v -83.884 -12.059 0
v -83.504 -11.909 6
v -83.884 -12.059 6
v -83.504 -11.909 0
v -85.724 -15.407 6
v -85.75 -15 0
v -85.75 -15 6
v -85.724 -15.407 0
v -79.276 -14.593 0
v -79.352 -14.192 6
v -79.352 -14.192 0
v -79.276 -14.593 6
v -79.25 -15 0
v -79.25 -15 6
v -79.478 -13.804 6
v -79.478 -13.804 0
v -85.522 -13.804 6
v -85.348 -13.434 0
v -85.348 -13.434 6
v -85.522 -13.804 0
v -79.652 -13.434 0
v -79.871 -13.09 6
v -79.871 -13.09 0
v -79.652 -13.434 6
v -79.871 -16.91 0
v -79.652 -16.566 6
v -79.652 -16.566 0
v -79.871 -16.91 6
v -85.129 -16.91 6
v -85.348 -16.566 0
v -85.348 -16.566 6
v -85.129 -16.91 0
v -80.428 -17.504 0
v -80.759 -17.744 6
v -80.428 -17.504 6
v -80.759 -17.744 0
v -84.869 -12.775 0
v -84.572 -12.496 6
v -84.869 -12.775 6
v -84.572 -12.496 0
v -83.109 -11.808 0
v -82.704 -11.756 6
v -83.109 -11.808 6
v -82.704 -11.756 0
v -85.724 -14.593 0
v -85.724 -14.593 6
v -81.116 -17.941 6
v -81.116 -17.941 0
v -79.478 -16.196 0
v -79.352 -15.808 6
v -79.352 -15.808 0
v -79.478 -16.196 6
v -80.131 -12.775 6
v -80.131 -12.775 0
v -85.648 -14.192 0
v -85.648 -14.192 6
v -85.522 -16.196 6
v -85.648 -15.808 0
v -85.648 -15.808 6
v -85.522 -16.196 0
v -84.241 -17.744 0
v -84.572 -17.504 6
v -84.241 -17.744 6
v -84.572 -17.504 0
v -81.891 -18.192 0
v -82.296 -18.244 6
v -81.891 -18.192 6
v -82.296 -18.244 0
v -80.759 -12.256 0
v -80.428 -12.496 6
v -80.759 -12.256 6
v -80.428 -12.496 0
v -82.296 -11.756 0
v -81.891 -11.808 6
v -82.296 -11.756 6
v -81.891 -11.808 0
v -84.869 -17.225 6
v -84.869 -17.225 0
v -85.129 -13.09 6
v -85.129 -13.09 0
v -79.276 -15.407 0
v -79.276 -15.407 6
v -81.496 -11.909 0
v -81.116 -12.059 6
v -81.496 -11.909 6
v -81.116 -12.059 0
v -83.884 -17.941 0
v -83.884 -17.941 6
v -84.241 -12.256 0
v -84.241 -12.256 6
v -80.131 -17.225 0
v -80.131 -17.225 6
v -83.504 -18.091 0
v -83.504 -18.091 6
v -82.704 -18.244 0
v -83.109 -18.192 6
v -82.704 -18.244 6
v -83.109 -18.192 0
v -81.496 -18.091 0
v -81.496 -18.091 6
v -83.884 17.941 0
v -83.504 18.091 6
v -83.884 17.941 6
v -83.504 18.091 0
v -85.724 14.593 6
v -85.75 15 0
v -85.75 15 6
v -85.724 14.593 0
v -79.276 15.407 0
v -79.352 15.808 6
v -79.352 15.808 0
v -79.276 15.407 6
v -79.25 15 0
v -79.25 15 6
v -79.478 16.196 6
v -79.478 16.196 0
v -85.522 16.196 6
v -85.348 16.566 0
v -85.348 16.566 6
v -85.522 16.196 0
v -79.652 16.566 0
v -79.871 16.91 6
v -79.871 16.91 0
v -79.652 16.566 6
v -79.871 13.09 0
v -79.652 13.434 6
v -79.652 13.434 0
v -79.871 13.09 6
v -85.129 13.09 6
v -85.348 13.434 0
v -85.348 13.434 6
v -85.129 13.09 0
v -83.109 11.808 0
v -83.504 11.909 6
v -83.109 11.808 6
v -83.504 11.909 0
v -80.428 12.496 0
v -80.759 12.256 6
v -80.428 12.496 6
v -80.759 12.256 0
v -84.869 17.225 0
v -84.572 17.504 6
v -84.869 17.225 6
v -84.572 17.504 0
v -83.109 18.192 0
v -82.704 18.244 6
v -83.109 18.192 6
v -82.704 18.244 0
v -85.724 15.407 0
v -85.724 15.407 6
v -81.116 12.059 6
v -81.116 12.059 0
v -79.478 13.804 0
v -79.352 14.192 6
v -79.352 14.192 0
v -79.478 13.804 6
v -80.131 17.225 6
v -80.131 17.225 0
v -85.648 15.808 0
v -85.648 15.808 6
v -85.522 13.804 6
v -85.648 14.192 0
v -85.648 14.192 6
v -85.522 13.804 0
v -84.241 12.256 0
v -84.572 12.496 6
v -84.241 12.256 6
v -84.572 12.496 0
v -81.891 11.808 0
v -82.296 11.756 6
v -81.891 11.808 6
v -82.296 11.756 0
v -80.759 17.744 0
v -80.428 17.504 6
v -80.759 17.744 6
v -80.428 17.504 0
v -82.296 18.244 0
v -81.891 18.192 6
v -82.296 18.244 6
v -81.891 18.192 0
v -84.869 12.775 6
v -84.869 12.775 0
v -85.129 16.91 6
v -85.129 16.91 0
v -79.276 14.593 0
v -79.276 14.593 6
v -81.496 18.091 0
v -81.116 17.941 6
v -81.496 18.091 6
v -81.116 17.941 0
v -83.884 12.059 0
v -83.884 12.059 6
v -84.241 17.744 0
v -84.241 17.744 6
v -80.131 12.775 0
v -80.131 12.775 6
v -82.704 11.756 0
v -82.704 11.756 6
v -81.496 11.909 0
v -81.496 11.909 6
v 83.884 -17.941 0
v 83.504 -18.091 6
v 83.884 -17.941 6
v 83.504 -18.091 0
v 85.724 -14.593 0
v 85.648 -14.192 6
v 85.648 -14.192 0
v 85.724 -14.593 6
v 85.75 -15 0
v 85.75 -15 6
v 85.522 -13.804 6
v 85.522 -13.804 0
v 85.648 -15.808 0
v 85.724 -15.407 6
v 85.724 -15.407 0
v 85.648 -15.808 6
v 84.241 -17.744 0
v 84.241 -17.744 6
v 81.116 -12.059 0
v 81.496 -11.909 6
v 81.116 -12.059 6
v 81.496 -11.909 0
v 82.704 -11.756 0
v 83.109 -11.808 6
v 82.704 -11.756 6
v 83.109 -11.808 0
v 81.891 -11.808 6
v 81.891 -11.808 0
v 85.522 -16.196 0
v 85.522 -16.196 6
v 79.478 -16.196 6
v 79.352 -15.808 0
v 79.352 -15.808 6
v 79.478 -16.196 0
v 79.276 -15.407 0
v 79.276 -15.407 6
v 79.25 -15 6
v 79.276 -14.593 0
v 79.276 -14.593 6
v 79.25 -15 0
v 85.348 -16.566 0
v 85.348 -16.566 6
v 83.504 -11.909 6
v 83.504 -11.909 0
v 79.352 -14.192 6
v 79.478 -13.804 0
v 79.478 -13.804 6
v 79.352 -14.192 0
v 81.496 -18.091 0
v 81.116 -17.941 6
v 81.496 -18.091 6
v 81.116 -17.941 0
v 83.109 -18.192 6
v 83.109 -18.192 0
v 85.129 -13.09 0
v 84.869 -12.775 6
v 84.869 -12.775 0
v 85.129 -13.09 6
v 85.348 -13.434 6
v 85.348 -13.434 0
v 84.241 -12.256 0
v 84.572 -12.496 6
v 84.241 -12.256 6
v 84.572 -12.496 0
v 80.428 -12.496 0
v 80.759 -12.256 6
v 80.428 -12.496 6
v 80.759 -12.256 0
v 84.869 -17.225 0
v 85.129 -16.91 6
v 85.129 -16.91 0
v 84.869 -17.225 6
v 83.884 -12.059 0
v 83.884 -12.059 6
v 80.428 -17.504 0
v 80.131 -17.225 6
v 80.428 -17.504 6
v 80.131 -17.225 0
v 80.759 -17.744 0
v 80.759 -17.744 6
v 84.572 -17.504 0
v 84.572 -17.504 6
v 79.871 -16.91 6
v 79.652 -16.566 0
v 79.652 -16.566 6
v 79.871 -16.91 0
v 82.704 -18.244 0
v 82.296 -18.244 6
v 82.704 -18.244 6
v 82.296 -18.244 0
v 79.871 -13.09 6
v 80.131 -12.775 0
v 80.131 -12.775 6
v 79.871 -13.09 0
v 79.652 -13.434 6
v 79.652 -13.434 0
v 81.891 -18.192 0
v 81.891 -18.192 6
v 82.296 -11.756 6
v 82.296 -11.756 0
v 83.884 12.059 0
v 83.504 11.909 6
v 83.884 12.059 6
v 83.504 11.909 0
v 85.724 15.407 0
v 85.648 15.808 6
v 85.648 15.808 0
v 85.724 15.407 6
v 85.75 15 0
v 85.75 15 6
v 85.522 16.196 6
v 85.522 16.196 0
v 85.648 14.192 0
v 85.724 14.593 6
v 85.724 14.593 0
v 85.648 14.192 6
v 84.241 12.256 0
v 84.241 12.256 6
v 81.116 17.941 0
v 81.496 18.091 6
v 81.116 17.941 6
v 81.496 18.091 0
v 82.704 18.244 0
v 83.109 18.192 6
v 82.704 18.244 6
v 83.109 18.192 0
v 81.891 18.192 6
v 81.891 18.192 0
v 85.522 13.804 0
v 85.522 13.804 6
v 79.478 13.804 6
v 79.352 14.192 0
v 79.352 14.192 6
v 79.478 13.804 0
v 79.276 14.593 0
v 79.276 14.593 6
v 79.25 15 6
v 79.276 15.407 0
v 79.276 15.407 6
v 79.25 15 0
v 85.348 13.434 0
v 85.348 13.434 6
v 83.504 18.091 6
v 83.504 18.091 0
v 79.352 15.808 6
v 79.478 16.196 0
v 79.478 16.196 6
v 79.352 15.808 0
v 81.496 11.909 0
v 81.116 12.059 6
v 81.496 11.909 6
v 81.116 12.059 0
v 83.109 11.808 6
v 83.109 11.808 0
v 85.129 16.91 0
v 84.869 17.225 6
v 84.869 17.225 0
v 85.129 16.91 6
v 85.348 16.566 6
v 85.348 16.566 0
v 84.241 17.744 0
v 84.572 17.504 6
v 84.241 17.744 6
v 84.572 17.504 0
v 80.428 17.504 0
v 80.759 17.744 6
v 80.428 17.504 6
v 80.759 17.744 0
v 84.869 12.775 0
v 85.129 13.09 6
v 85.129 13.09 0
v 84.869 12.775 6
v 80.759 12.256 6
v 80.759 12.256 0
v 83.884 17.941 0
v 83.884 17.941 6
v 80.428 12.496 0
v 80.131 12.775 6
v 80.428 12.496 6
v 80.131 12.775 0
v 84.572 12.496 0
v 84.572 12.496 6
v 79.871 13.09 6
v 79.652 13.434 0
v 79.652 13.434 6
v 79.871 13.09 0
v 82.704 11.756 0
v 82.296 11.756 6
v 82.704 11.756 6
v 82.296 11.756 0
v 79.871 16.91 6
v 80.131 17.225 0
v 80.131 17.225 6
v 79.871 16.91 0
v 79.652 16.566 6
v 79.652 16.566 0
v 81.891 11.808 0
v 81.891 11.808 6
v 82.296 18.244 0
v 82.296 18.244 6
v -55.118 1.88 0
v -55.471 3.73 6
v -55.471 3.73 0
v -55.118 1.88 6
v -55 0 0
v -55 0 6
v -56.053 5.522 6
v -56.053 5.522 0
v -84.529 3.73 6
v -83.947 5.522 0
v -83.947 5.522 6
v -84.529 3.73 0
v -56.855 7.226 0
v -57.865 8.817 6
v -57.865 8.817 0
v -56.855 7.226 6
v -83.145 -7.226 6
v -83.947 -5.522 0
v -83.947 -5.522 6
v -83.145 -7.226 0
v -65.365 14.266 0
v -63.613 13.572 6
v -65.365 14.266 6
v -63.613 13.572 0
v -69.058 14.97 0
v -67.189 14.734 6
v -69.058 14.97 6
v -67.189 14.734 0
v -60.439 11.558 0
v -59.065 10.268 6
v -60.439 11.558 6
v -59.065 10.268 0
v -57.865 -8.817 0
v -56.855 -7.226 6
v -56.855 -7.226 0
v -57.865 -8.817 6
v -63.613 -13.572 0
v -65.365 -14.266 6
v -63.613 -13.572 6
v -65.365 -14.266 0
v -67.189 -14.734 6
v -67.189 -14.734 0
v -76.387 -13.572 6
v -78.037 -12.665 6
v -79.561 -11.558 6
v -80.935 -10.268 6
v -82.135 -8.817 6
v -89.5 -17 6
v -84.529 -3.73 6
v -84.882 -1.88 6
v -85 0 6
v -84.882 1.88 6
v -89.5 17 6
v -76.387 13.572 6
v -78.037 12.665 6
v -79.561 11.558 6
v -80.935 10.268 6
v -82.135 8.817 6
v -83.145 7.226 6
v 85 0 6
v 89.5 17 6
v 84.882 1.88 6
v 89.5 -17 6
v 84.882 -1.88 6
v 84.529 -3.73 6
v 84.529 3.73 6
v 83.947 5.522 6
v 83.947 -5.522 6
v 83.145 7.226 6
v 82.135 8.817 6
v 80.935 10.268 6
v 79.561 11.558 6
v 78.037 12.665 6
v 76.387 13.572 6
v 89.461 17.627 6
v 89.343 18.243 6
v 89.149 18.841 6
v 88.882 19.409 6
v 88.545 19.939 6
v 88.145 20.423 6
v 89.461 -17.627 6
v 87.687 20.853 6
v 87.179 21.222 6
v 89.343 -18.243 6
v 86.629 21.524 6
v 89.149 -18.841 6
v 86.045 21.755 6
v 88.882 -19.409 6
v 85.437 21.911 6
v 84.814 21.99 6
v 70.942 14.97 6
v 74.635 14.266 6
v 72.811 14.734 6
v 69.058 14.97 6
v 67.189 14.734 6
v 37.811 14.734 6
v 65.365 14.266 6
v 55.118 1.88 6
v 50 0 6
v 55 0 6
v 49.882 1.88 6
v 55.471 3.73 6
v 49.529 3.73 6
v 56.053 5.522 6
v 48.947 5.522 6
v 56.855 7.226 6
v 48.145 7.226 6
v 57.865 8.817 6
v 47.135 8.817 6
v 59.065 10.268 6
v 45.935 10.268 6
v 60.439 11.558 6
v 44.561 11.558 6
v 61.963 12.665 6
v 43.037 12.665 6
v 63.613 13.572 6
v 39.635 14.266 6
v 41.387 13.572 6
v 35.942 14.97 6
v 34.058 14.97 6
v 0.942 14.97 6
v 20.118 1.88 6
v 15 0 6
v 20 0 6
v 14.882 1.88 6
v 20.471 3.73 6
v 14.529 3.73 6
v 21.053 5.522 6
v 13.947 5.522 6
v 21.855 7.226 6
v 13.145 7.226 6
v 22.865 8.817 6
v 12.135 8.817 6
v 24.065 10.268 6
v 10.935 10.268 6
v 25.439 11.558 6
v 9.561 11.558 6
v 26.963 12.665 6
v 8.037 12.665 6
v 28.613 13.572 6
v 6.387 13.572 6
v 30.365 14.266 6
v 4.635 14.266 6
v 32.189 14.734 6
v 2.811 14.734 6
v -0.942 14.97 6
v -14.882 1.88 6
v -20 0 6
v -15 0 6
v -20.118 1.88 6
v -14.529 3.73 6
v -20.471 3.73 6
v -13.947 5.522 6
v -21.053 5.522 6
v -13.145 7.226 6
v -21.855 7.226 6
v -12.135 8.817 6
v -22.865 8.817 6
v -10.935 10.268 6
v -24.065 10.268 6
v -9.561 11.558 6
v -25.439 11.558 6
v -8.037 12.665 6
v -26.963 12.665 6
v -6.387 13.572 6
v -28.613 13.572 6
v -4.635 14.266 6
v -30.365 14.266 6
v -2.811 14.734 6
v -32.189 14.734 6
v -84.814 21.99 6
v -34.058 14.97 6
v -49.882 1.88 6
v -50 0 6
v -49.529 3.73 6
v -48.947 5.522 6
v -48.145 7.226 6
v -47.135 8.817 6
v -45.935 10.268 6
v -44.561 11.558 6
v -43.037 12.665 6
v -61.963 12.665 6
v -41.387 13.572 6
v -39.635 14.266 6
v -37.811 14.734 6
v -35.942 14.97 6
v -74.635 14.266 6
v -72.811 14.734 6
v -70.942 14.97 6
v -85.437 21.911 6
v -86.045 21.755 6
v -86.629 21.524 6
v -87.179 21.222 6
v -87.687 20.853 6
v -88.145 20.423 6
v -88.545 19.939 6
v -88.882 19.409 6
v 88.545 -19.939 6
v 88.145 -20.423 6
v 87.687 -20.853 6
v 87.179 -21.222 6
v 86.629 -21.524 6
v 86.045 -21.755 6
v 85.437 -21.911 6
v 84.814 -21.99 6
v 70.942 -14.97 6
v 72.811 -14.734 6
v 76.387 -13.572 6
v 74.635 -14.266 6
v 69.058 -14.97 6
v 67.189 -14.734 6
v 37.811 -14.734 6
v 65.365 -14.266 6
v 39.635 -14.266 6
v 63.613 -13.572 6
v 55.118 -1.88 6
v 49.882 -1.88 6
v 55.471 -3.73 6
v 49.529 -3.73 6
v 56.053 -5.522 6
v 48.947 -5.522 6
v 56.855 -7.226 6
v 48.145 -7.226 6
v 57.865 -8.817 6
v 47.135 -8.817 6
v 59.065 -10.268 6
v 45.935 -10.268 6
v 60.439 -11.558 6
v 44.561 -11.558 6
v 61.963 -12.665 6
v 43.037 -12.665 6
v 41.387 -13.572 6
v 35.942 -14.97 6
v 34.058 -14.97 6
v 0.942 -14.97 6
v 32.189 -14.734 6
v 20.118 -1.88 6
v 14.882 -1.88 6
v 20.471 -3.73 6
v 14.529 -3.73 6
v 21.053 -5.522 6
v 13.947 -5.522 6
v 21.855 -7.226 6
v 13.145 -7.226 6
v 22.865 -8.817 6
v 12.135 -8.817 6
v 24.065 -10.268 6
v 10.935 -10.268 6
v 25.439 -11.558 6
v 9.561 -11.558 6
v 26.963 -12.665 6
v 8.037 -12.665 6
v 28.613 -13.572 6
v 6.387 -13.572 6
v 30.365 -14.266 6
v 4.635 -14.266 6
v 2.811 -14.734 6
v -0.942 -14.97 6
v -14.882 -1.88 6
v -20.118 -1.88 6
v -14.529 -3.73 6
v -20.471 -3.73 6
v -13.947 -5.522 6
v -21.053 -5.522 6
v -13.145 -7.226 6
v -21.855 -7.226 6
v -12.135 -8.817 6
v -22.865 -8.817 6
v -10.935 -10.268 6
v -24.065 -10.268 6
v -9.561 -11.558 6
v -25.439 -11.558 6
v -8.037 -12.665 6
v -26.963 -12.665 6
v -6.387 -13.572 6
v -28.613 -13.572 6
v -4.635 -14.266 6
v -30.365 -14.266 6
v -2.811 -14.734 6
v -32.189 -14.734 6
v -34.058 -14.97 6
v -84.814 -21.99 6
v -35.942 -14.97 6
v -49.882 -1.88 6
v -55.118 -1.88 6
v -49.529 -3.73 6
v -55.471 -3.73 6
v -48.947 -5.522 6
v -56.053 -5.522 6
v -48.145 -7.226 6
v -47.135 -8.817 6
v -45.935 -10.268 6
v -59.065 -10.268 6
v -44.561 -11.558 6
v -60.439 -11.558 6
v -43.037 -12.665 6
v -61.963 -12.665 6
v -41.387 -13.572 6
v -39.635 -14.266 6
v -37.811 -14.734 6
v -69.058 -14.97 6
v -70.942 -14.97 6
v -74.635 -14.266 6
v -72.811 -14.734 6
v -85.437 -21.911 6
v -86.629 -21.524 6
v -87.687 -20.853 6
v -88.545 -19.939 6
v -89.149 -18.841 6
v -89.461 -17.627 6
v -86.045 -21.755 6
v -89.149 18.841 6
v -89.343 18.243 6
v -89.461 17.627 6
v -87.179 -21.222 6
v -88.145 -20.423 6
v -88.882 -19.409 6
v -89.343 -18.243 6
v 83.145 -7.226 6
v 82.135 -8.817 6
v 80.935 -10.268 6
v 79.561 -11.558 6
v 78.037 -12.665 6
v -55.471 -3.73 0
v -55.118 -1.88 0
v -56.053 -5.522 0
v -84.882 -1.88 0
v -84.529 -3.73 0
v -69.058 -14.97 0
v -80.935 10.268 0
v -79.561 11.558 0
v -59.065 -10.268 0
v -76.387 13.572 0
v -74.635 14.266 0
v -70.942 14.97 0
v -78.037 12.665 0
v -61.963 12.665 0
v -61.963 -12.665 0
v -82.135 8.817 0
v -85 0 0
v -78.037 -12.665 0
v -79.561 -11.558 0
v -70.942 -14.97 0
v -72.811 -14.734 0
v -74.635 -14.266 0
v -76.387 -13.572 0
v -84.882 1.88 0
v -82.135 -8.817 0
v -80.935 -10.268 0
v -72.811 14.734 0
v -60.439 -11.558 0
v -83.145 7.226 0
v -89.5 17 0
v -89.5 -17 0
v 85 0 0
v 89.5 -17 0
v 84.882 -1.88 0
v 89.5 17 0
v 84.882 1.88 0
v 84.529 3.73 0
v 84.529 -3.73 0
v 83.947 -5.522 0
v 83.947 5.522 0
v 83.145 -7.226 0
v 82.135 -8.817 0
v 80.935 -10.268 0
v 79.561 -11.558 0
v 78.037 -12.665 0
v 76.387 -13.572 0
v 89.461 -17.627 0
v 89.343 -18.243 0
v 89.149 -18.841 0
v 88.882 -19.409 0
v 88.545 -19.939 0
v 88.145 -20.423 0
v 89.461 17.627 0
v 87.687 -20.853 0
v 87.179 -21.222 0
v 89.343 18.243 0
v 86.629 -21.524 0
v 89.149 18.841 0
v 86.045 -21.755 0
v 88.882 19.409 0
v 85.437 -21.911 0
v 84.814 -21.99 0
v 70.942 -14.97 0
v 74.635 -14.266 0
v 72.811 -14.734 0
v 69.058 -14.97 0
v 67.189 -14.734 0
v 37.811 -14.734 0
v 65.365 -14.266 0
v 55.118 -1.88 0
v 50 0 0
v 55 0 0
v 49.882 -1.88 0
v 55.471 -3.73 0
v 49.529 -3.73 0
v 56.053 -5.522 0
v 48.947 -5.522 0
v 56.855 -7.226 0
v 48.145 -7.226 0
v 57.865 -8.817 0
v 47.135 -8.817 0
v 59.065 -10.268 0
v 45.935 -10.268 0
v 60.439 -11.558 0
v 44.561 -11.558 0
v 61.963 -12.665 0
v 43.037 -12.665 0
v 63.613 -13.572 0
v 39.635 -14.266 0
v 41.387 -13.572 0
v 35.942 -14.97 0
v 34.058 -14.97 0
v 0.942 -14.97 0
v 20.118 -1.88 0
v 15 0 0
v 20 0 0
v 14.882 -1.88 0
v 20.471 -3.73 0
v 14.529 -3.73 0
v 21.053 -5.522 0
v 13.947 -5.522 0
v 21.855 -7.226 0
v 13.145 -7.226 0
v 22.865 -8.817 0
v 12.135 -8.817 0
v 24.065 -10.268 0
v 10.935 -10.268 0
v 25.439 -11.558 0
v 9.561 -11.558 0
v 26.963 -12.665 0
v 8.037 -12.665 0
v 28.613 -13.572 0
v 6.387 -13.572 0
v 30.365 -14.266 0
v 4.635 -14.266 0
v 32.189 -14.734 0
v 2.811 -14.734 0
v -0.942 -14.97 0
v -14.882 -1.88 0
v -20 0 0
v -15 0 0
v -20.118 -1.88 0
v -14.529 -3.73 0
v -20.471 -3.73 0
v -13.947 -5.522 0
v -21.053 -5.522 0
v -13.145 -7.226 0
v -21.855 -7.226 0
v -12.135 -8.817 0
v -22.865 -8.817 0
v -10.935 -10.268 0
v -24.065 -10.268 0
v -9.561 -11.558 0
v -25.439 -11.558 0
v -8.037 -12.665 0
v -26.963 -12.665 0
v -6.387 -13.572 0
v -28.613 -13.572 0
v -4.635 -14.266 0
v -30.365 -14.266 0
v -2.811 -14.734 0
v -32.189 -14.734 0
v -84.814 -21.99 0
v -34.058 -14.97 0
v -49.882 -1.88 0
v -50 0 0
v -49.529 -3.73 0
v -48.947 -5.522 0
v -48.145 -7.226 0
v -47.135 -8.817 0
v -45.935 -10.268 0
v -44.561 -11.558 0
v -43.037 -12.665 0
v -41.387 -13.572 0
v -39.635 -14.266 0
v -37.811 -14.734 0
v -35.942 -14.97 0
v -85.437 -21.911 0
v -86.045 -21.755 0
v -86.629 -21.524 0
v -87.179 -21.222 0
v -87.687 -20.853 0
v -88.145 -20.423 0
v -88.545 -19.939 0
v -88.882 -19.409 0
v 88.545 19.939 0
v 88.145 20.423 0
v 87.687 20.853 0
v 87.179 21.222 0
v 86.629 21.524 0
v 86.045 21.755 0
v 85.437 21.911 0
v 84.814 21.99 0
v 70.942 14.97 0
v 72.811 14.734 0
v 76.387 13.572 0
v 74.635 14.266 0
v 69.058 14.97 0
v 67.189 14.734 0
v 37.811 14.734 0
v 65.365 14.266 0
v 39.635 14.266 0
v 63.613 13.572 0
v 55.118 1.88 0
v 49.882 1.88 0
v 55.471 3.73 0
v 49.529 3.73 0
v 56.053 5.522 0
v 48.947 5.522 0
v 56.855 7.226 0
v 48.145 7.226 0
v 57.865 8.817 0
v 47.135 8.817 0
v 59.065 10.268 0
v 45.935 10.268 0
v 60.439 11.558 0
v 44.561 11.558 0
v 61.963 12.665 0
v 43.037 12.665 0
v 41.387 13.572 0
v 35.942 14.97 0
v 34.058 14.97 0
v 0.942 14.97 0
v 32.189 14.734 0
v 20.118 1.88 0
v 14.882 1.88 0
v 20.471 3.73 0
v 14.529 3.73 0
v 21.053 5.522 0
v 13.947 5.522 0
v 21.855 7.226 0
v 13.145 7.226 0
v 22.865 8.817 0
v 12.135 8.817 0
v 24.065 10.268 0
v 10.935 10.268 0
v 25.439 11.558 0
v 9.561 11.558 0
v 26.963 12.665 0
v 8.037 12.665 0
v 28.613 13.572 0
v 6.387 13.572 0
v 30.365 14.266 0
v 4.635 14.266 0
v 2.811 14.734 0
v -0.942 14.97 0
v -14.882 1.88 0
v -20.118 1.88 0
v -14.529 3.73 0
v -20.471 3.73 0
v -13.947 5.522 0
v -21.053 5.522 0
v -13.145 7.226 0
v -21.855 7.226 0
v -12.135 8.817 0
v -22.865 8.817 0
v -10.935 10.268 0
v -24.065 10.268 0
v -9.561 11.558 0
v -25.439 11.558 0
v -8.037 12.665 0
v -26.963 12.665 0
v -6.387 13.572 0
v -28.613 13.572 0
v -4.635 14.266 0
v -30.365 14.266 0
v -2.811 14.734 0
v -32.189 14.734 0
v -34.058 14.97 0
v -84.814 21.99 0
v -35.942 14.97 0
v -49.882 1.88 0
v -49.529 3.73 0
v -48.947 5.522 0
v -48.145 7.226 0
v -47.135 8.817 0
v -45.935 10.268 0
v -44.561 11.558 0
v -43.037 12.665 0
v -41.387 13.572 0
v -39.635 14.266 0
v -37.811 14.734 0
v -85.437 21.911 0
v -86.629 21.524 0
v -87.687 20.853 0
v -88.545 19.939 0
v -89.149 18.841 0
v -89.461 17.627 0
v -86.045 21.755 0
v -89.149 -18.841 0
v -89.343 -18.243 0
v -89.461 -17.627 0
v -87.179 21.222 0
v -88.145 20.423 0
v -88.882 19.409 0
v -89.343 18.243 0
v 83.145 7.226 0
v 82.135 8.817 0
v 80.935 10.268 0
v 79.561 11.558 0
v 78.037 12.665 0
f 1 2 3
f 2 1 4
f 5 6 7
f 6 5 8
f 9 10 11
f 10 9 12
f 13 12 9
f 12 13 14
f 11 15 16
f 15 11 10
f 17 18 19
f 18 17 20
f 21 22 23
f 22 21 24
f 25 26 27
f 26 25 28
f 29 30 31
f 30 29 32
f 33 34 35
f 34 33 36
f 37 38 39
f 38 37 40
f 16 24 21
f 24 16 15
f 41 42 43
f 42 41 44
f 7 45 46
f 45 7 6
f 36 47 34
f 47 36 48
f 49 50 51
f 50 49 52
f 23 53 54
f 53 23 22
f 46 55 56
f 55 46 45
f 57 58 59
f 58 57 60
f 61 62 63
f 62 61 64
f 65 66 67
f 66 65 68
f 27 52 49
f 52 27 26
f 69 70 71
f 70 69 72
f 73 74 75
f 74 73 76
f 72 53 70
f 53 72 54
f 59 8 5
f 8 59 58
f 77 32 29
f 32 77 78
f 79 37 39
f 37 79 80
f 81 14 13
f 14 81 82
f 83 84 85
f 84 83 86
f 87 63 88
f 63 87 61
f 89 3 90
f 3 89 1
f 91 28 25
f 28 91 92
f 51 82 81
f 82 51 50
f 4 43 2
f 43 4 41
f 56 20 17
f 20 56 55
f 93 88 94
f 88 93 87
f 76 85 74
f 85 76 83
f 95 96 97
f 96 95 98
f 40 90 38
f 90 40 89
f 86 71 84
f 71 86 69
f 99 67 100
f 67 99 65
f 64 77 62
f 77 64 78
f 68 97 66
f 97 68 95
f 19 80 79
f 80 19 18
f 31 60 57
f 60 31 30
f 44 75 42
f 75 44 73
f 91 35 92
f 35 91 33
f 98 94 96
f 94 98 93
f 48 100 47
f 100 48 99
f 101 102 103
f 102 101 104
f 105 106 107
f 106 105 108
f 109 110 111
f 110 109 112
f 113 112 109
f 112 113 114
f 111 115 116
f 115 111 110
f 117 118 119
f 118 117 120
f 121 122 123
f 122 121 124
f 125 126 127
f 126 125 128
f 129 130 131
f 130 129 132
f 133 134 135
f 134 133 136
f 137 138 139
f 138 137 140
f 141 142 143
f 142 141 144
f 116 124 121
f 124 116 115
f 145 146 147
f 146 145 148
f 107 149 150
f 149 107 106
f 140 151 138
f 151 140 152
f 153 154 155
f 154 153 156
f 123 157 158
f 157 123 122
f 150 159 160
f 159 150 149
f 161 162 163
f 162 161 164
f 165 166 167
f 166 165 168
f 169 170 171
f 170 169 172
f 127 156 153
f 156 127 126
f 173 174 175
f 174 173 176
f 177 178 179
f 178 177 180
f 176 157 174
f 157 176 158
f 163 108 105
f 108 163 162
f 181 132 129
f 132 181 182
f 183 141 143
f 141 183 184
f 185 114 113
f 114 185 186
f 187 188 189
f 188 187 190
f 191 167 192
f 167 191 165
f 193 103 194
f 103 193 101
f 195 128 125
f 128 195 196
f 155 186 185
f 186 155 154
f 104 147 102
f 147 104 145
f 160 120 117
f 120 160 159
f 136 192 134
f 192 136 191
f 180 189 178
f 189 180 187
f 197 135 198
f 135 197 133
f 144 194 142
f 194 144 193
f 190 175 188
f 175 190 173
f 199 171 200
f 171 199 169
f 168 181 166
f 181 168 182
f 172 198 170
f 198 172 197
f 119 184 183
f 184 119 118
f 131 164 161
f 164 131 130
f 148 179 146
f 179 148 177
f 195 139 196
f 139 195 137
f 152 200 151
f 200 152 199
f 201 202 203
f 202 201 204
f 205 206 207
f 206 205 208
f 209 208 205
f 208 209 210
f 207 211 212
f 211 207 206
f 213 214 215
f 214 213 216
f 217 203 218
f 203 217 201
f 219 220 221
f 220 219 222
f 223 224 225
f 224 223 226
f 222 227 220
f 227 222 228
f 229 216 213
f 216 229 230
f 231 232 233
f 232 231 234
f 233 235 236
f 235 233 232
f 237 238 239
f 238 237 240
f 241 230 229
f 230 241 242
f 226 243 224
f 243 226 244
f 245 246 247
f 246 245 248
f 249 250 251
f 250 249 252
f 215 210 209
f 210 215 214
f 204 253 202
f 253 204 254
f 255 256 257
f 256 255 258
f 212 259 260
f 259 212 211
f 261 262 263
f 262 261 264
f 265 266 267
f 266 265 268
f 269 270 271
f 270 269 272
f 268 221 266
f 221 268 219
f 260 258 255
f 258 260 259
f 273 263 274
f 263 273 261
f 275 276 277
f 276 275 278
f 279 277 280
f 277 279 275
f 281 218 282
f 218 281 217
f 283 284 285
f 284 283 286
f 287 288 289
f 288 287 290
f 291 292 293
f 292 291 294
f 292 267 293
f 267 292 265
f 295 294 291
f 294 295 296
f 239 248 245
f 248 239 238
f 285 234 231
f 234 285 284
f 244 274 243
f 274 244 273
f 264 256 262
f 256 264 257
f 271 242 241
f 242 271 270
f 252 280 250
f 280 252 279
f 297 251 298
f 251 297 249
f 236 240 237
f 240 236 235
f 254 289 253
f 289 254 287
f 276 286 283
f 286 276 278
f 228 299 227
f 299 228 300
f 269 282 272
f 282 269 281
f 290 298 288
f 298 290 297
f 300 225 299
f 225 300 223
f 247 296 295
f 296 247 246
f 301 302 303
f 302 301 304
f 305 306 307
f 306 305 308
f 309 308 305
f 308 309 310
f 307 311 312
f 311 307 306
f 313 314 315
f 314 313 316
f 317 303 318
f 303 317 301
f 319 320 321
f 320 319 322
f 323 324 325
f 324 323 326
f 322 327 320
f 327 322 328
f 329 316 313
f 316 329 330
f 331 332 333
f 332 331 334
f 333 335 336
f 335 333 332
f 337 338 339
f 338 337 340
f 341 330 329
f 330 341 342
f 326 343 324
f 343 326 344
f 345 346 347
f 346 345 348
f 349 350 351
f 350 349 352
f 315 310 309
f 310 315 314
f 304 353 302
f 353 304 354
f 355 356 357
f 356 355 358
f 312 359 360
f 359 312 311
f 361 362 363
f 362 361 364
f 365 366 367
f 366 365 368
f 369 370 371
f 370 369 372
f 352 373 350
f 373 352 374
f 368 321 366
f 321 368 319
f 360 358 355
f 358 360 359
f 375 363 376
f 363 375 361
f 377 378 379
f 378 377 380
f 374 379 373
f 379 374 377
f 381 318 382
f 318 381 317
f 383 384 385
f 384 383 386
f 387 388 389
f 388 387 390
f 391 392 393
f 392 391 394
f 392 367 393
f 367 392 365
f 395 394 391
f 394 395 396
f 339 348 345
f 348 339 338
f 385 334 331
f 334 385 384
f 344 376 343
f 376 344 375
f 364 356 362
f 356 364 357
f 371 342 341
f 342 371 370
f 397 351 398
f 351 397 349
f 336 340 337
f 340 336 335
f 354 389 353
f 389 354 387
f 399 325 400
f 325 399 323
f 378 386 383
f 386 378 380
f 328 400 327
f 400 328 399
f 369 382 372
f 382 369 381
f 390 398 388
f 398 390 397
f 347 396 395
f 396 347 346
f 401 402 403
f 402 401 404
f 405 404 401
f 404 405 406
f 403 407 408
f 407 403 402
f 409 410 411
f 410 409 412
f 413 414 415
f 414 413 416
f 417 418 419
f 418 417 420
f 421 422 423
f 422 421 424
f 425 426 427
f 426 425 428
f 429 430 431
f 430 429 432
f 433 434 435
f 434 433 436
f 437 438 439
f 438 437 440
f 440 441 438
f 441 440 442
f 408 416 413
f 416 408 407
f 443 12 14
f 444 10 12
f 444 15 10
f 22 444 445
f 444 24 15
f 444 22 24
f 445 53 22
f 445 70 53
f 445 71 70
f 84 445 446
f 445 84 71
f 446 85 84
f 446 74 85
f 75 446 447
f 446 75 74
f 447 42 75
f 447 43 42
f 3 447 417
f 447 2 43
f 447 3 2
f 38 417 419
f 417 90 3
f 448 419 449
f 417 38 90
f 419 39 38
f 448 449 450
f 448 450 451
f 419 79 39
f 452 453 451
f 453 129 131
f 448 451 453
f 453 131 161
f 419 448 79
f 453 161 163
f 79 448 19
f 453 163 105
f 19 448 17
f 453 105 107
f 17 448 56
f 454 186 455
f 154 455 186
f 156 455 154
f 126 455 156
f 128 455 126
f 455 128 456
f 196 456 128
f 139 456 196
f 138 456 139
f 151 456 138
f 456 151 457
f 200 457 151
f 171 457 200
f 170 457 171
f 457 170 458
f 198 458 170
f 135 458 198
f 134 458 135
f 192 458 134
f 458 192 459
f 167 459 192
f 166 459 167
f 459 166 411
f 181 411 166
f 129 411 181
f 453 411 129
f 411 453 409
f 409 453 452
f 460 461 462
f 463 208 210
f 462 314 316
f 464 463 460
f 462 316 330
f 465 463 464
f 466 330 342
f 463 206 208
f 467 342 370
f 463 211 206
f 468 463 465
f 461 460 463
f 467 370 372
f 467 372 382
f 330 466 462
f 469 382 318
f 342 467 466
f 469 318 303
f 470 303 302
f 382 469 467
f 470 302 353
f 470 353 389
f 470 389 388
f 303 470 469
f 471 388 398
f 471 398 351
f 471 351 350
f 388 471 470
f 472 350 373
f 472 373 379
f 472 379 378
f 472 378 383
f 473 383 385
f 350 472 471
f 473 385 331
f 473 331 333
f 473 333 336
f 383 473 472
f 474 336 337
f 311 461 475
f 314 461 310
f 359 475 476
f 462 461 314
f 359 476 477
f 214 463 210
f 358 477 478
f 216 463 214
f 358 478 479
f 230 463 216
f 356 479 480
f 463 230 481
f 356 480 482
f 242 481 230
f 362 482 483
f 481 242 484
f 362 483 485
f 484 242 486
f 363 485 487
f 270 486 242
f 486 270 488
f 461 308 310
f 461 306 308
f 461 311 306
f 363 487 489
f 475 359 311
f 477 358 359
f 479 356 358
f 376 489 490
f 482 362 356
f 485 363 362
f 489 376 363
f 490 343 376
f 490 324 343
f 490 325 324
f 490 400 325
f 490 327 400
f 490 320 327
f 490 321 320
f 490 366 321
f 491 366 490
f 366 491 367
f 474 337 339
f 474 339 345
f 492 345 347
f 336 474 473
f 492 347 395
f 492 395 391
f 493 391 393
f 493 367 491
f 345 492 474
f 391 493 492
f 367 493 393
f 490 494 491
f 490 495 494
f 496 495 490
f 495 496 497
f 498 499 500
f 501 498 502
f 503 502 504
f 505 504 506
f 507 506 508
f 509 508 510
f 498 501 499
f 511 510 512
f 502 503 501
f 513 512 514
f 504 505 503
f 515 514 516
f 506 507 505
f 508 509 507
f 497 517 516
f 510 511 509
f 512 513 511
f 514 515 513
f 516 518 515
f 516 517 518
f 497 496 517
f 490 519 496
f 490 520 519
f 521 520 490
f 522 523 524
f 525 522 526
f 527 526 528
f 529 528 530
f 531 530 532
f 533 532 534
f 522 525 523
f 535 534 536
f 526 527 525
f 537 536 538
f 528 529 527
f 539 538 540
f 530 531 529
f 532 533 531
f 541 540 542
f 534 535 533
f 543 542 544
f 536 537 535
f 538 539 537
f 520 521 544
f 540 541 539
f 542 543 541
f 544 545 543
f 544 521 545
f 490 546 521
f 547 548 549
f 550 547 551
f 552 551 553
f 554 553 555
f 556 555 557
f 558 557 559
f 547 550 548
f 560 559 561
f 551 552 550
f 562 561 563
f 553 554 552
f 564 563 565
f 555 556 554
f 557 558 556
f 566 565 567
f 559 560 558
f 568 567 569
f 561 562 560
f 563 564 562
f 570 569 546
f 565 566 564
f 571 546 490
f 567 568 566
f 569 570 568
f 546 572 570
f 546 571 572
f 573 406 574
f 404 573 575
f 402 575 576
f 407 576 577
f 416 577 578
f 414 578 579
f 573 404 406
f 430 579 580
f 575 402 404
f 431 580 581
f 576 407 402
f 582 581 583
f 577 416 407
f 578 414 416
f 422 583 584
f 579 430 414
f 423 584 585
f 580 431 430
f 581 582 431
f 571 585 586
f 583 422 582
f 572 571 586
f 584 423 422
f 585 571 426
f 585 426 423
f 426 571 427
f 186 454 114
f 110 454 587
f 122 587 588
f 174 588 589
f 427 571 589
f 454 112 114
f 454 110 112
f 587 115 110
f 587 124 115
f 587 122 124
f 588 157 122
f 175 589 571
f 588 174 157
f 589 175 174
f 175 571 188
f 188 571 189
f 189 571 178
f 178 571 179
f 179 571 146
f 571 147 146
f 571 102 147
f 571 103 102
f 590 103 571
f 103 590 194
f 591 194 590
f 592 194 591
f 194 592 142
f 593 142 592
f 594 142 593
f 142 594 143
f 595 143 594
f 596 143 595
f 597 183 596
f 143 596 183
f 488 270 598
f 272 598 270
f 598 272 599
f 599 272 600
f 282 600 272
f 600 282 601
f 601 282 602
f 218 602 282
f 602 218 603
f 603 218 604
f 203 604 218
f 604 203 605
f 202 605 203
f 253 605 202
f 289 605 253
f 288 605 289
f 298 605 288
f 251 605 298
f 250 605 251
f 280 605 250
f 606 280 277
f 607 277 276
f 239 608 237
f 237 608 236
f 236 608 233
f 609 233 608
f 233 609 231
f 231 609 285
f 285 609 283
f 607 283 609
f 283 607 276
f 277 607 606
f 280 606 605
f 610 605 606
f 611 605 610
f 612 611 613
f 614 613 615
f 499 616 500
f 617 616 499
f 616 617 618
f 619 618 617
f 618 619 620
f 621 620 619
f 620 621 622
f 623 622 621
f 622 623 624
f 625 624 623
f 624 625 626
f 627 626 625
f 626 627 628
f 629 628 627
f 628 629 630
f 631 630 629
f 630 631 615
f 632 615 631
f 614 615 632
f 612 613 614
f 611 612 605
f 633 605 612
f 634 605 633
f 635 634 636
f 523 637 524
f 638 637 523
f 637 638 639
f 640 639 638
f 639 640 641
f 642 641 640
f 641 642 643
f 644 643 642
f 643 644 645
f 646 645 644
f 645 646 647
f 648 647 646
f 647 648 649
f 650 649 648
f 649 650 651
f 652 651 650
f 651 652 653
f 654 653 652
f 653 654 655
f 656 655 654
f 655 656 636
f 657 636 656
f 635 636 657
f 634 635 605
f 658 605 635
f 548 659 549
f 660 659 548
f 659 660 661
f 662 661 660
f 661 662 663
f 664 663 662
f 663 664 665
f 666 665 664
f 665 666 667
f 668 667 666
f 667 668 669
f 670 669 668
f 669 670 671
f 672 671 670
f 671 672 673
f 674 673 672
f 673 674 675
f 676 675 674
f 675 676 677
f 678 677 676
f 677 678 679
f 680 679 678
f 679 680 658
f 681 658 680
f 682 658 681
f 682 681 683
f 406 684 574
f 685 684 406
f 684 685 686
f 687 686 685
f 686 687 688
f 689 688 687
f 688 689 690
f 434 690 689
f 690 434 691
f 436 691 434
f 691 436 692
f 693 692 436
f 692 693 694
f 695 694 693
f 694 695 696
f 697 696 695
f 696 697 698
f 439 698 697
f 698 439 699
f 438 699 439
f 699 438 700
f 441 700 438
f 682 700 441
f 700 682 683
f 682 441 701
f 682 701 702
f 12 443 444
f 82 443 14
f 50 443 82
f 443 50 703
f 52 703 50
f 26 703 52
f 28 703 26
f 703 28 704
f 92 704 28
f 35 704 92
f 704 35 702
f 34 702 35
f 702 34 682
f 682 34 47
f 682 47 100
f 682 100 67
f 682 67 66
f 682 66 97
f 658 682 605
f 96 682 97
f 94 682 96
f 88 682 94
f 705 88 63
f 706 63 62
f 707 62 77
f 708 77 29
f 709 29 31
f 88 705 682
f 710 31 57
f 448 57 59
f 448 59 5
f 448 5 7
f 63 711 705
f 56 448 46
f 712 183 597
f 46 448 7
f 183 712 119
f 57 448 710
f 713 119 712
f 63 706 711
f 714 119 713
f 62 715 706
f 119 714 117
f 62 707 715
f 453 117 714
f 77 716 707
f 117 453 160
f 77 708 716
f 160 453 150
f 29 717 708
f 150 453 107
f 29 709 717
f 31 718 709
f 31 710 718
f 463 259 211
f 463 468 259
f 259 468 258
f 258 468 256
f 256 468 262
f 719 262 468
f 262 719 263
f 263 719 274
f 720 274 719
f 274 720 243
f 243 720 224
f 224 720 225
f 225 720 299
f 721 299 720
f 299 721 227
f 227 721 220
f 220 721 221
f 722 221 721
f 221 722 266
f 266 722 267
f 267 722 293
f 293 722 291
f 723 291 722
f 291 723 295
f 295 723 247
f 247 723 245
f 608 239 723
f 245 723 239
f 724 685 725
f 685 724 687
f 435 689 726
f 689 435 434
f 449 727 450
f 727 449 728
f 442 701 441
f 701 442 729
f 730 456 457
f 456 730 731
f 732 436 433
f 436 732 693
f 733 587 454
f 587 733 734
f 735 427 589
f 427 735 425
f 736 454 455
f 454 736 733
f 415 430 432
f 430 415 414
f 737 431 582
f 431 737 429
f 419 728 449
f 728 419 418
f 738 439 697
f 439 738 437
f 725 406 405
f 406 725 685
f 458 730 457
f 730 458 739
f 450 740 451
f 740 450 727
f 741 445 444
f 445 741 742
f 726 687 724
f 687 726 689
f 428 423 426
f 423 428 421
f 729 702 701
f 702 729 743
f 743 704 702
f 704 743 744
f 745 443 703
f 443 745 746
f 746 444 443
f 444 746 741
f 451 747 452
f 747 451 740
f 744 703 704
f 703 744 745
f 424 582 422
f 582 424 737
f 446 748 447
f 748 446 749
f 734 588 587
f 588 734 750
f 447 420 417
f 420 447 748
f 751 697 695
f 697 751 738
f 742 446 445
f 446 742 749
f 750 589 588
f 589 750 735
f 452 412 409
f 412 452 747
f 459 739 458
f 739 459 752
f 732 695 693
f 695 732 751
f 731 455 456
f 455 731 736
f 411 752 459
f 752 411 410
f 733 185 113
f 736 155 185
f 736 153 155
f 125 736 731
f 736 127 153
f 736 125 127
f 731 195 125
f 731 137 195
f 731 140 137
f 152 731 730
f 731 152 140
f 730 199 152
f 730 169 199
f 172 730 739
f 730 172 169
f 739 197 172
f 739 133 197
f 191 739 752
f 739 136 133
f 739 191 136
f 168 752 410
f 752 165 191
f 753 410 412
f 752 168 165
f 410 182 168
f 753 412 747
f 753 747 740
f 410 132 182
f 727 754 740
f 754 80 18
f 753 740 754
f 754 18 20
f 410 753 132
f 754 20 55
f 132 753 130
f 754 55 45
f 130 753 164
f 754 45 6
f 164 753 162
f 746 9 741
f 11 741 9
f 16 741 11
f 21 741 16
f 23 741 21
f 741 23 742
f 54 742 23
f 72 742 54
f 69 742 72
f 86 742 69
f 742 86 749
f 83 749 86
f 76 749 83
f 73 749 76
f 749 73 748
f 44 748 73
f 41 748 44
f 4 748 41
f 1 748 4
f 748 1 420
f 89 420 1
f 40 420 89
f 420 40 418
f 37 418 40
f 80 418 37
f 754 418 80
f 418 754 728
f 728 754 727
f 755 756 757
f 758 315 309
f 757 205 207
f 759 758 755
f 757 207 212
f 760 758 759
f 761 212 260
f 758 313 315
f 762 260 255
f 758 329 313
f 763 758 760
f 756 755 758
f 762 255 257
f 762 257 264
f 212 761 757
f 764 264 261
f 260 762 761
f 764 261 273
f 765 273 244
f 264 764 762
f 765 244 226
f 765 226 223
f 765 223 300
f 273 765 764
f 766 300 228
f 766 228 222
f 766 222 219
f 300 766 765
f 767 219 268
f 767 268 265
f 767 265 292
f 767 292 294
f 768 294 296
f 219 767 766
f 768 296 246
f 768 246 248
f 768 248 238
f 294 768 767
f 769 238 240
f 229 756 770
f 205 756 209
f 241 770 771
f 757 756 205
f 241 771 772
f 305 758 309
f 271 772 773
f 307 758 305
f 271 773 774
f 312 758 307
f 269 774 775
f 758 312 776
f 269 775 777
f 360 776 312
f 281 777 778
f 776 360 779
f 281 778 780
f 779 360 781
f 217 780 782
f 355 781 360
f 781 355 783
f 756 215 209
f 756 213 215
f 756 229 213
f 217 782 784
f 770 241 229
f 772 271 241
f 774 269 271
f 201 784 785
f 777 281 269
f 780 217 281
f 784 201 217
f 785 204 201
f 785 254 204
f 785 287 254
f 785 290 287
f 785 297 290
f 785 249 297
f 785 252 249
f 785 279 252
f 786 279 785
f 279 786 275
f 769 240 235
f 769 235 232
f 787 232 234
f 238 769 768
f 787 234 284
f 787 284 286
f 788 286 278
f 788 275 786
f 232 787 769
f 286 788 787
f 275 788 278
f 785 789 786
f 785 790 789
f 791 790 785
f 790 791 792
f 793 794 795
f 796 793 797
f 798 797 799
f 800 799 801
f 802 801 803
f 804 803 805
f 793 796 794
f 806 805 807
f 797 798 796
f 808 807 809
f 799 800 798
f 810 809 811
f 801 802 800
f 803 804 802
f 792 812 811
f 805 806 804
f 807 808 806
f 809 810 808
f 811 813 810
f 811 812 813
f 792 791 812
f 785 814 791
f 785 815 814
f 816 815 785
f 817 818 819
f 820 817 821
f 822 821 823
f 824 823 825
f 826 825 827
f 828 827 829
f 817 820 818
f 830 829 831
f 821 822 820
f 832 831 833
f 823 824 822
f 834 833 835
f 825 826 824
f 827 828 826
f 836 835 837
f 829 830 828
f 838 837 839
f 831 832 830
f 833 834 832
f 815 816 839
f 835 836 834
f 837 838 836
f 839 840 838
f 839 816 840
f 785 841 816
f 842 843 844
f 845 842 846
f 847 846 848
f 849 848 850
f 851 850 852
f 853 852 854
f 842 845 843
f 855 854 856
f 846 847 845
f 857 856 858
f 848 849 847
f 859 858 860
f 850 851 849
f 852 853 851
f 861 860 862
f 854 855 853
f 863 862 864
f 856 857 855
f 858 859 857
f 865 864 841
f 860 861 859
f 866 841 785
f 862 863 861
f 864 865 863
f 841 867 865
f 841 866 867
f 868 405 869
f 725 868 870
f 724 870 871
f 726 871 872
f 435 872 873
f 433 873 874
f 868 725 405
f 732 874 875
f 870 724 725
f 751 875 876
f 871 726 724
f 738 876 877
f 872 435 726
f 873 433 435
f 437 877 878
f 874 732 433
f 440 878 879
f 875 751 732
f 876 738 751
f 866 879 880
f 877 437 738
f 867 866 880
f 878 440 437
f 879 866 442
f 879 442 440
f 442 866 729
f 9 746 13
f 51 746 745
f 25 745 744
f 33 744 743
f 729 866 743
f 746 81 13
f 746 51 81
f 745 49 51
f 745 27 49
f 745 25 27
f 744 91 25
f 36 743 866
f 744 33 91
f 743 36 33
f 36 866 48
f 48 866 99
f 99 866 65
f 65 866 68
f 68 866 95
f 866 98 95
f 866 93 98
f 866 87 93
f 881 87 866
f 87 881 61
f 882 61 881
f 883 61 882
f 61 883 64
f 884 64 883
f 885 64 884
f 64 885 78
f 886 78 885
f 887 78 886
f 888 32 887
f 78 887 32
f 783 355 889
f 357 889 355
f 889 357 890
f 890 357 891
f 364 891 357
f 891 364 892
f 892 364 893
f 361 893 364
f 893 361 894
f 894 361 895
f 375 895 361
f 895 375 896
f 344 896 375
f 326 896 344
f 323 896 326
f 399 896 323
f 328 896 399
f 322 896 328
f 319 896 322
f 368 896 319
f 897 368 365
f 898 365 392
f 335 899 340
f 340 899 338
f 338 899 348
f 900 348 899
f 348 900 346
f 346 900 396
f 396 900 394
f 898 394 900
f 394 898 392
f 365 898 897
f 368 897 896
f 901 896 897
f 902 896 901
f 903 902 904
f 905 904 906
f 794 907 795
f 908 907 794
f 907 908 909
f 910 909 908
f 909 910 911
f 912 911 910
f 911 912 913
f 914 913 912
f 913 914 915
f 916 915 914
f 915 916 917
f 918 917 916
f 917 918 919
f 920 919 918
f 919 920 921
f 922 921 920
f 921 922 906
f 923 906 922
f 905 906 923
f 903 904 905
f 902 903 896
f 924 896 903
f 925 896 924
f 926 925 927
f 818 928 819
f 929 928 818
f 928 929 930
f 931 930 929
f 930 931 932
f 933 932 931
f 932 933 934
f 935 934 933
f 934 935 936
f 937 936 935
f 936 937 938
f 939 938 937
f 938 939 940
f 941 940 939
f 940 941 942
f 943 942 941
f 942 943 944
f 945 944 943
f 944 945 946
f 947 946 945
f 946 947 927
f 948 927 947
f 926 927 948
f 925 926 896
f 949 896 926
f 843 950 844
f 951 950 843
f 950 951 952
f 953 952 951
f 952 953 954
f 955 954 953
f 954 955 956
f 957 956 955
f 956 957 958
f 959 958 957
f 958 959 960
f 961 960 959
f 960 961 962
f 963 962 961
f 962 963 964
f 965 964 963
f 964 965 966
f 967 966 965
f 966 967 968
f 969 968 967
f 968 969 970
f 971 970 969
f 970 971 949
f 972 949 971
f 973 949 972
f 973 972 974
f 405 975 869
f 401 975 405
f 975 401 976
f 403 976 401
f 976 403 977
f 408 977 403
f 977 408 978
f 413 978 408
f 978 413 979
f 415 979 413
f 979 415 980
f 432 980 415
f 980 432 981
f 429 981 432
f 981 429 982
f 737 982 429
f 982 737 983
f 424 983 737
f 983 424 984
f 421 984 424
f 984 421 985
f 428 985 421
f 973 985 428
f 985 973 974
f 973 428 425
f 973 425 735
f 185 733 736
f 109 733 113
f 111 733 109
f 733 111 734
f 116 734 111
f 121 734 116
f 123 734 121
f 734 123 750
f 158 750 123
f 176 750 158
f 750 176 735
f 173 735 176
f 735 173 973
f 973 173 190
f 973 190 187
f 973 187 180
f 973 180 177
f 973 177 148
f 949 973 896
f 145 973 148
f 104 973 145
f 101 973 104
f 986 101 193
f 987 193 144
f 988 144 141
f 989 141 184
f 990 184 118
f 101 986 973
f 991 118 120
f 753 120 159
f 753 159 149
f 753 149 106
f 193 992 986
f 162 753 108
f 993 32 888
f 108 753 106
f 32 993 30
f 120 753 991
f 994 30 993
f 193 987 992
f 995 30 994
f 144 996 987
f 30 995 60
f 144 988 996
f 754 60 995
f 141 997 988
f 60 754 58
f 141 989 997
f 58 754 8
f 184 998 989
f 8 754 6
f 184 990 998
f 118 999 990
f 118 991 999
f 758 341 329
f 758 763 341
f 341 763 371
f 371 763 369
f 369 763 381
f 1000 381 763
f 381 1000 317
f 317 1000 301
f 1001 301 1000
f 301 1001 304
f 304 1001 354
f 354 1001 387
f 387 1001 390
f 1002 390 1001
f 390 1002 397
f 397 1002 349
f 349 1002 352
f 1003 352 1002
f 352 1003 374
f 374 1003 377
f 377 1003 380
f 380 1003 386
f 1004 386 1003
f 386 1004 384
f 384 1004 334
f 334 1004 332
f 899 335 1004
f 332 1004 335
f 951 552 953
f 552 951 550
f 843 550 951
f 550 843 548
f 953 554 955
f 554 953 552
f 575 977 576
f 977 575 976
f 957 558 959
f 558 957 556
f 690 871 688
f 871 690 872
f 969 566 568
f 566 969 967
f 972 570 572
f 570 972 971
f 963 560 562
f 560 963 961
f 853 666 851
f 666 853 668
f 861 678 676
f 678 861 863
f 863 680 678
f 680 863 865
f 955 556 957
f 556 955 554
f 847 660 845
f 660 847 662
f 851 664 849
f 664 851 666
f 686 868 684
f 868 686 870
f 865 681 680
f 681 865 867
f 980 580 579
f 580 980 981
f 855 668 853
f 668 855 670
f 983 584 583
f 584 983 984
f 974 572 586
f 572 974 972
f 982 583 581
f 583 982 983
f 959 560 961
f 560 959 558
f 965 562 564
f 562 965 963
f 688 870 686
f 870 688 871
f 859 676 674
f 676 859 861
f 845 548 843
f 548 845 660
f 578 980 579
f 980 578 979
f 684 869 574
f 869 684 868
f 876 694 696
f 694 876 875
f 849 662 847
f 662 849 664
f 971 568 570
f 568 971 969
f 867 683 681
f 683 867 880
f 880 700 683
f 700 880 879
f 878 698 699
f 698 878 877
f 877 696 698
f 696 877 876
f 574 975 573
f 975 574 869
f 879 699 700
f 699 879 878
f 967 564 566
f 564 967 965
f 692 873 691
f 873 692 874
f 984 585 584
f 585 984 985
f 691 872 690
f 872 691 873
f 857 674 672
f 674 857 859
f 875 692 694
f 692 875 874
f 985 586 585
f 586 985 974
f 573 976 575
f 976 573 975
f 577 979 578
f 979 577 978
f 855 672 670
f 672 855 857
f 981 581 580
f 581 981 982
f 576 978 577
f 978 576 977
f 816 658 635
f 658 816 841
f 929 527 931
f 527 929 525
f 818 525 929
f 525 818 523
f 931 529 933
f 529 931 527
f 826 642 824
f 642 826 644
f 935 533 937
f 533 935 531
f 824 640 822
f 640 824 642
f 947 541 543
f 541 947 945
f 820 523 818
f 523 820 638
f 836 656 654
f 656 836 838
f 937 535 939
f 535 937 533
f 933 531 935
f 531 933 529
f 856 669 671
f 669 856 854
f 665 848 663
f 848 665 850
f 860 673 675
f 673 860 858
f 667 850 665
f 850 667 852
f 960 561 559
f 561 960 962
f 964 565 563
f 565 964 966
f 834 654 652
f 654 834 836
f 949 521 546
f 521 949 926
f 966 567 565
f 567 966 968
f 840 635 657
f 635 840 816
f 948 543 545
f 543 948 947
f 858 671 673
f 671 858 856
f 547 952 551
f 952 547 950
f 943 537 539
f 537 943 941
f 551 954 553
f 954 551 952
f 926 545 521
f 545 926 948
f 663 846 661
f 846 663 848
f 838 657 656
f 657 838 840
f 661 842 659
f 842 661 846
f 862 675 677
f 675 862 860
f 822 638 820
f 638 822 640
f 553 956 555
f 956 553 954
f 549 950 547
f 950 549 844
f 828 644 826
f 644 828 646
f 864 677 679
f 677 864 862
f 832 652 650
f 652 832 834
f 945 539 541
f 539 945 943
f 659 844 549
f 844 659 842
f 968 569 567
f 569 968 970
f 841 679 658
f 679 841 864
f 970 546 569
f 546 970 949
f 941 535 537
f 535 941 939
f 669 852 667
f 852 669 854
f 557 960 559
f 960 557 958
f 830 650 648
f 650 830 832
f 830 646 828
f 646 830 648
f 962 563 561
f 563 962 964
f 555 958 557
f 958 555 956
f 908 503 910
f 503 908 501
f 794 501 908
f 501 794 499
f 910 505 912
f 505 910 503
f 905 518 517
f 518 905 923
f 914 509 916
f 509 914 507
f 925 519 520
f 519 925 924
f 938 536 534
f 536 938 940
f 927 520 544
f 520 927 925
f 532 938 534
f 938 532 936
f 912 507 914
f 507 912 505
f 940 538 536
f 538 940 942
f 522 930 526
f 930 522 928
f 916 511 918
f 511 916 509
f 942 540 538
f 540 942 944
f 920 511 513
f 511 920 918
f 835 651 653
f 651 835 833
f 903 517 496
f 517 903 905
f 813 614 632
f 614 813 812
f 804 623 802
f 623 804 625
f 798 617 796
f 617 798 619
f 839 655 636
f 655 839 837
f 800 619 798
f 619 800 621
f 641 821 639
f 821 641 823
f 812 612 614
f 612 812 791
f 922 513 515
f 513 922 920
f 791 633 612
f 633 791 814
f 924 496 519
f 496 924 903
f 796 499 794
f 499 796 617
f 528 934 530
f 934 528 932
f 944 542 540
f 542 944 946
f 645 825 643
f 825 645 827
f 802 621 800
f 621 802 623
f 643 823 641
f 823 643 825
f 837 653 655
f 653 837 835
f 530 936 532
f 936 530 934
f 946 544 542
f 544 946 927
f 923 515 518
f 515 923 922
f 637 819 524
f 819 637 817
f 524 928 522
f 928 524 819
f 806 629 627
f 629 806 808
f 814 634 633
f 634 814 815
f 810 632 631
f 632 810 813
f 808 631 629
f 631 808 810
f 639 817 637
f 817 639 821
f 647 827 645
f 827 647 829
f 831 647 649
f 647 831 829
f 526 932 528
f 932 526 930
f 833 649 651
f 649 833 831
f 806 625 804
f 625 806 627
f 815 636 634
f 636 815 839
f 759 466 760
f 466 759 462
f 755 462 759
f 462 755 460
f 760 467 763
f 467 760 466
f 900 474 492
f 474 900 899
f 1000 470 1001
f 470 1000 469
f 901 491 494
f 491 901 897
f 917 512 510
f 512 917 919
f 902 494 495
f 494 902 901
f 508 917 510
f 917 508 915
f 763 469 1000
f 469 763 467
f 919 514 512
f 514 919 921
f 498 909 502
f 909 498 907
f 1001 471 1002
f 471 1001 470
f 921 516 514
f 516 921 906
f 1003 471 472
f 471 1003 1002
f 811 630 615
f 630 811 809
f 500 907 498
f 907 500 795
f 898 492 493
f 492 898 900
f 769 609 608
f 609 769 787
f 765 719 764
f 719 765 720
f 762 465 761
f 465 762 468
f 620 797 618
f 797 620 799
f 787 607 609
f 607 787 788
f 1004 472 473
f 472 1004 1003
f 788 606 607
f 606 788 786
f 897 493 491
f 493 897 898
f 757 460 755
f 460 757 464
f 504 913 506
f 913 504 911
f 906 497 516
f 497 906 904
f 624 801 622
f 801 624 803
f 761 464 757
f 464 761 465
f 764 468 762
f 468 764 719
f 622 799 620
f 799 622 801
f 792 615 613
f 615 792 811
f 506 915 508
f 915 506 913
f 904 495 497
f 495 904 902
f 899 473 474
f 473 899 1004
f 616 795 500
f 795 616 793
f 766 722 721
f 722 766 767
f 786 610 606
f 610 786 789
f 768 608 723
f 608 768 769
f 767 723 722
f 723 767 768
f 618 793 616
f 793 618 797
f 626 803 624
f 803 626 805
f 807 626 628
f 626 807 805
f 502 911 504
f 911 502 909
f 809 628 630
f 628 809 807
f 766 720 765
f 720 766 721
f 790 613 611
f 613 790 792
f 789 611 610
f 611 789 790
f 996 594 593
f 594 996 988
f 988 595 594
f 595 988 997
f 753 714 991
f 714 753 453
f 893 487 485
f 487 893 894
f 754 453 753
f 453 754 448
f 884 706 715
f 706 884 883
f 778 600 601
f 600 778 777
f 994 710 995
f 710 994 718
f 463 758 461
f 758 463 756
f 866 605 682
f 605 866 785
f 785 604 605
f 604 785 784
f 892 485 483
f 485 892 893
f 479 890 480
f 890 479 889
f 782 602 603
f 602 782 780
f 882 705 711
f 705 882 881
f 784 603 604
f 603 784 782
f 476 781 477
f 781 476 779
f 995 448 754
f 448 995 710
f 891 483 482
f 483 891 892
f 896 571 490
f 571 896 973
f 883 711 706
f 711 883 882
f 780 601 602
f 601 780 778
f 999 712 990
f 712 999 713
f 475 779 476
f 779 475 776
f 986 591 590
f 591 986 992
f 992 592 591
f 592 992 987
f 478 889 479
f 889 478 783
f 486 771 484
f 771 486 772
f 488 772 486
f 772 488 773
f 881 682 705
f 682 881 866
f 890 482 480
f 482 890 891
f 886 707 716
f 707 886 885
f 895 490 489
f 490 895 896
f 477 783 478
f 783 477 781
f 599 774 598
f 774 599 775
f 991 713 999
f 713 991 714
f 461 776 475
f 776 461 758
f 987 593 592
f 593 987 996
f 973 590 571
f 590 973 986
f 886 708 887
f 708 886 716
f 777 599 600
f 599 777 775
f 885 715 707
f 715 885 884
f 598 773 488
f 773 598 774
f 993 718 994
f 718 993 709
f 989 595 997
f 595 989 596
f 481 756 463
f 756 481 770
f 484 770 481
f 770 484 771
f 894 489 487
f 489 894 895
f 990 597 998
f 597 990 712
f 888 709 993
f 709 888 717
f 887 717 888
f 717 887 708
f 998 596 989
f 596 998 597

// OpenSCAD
$fn = 50;


difference() {
	union() {
		hull() {
			translate(v = [-84.5000000000, 17.0000000000, 0]) {
				cylinder(h = 6, r = 5);
			}
			translate(v = [84.5000000000, 17.0000000000, 0]) {
				cylinder(h = 6, r = 5);
			}
			translate(v = [-84.5000000000, -17.0000000000, 0]) {
				cylinder(h = 6, r = 5);
			}
			translate(v = [84.5000000000, -17.0000000000, 0]) {
				cylinder(h = 6, r = 5);
			}
		}
	}
	union() {
		#translate(v = [-82.5000000000, -15.0000000000, -100.0000000000]) {
			cylinder(h = 200, r = 3.2500000000);
		}
		#translate(v = [-82.5000000000, 15.0000000000, -100.0000000000]) {
			cylinder(h = 200, r = 3.2500000000);
		}
		#translate(v = [82.5000000000, -15.0000000000, -100.0000000000]) {
			cylinder(h = 200, r = 3.2500000000);
		}
		#translate(v = [82.5000000000, 15.0000000000, -100.0000000000]) {
			cylinder(h = 200, r = 3.2500000000);
		}
		#translate(v = [-70.0000000000, 0, 0]) {
			cylinder(h = 6, r = 15.0000000000);
		}
		#translate(v = [-35.0000000000, 0, 0]) {
			cylinder(h = 6, r = 15.0000000000);
		}
		#cylinder(h = 6, r = 15.0000000000);
		#translate(v = [35.0000000000, 0, 0]) {
			cylinder(h = 6, r = 15.0000000000);
		}
		#translate(v = [70.0000000000, 0, 0]) {
			cylinder(h = 6, r = 15.0000000000);
		}
	}
}
